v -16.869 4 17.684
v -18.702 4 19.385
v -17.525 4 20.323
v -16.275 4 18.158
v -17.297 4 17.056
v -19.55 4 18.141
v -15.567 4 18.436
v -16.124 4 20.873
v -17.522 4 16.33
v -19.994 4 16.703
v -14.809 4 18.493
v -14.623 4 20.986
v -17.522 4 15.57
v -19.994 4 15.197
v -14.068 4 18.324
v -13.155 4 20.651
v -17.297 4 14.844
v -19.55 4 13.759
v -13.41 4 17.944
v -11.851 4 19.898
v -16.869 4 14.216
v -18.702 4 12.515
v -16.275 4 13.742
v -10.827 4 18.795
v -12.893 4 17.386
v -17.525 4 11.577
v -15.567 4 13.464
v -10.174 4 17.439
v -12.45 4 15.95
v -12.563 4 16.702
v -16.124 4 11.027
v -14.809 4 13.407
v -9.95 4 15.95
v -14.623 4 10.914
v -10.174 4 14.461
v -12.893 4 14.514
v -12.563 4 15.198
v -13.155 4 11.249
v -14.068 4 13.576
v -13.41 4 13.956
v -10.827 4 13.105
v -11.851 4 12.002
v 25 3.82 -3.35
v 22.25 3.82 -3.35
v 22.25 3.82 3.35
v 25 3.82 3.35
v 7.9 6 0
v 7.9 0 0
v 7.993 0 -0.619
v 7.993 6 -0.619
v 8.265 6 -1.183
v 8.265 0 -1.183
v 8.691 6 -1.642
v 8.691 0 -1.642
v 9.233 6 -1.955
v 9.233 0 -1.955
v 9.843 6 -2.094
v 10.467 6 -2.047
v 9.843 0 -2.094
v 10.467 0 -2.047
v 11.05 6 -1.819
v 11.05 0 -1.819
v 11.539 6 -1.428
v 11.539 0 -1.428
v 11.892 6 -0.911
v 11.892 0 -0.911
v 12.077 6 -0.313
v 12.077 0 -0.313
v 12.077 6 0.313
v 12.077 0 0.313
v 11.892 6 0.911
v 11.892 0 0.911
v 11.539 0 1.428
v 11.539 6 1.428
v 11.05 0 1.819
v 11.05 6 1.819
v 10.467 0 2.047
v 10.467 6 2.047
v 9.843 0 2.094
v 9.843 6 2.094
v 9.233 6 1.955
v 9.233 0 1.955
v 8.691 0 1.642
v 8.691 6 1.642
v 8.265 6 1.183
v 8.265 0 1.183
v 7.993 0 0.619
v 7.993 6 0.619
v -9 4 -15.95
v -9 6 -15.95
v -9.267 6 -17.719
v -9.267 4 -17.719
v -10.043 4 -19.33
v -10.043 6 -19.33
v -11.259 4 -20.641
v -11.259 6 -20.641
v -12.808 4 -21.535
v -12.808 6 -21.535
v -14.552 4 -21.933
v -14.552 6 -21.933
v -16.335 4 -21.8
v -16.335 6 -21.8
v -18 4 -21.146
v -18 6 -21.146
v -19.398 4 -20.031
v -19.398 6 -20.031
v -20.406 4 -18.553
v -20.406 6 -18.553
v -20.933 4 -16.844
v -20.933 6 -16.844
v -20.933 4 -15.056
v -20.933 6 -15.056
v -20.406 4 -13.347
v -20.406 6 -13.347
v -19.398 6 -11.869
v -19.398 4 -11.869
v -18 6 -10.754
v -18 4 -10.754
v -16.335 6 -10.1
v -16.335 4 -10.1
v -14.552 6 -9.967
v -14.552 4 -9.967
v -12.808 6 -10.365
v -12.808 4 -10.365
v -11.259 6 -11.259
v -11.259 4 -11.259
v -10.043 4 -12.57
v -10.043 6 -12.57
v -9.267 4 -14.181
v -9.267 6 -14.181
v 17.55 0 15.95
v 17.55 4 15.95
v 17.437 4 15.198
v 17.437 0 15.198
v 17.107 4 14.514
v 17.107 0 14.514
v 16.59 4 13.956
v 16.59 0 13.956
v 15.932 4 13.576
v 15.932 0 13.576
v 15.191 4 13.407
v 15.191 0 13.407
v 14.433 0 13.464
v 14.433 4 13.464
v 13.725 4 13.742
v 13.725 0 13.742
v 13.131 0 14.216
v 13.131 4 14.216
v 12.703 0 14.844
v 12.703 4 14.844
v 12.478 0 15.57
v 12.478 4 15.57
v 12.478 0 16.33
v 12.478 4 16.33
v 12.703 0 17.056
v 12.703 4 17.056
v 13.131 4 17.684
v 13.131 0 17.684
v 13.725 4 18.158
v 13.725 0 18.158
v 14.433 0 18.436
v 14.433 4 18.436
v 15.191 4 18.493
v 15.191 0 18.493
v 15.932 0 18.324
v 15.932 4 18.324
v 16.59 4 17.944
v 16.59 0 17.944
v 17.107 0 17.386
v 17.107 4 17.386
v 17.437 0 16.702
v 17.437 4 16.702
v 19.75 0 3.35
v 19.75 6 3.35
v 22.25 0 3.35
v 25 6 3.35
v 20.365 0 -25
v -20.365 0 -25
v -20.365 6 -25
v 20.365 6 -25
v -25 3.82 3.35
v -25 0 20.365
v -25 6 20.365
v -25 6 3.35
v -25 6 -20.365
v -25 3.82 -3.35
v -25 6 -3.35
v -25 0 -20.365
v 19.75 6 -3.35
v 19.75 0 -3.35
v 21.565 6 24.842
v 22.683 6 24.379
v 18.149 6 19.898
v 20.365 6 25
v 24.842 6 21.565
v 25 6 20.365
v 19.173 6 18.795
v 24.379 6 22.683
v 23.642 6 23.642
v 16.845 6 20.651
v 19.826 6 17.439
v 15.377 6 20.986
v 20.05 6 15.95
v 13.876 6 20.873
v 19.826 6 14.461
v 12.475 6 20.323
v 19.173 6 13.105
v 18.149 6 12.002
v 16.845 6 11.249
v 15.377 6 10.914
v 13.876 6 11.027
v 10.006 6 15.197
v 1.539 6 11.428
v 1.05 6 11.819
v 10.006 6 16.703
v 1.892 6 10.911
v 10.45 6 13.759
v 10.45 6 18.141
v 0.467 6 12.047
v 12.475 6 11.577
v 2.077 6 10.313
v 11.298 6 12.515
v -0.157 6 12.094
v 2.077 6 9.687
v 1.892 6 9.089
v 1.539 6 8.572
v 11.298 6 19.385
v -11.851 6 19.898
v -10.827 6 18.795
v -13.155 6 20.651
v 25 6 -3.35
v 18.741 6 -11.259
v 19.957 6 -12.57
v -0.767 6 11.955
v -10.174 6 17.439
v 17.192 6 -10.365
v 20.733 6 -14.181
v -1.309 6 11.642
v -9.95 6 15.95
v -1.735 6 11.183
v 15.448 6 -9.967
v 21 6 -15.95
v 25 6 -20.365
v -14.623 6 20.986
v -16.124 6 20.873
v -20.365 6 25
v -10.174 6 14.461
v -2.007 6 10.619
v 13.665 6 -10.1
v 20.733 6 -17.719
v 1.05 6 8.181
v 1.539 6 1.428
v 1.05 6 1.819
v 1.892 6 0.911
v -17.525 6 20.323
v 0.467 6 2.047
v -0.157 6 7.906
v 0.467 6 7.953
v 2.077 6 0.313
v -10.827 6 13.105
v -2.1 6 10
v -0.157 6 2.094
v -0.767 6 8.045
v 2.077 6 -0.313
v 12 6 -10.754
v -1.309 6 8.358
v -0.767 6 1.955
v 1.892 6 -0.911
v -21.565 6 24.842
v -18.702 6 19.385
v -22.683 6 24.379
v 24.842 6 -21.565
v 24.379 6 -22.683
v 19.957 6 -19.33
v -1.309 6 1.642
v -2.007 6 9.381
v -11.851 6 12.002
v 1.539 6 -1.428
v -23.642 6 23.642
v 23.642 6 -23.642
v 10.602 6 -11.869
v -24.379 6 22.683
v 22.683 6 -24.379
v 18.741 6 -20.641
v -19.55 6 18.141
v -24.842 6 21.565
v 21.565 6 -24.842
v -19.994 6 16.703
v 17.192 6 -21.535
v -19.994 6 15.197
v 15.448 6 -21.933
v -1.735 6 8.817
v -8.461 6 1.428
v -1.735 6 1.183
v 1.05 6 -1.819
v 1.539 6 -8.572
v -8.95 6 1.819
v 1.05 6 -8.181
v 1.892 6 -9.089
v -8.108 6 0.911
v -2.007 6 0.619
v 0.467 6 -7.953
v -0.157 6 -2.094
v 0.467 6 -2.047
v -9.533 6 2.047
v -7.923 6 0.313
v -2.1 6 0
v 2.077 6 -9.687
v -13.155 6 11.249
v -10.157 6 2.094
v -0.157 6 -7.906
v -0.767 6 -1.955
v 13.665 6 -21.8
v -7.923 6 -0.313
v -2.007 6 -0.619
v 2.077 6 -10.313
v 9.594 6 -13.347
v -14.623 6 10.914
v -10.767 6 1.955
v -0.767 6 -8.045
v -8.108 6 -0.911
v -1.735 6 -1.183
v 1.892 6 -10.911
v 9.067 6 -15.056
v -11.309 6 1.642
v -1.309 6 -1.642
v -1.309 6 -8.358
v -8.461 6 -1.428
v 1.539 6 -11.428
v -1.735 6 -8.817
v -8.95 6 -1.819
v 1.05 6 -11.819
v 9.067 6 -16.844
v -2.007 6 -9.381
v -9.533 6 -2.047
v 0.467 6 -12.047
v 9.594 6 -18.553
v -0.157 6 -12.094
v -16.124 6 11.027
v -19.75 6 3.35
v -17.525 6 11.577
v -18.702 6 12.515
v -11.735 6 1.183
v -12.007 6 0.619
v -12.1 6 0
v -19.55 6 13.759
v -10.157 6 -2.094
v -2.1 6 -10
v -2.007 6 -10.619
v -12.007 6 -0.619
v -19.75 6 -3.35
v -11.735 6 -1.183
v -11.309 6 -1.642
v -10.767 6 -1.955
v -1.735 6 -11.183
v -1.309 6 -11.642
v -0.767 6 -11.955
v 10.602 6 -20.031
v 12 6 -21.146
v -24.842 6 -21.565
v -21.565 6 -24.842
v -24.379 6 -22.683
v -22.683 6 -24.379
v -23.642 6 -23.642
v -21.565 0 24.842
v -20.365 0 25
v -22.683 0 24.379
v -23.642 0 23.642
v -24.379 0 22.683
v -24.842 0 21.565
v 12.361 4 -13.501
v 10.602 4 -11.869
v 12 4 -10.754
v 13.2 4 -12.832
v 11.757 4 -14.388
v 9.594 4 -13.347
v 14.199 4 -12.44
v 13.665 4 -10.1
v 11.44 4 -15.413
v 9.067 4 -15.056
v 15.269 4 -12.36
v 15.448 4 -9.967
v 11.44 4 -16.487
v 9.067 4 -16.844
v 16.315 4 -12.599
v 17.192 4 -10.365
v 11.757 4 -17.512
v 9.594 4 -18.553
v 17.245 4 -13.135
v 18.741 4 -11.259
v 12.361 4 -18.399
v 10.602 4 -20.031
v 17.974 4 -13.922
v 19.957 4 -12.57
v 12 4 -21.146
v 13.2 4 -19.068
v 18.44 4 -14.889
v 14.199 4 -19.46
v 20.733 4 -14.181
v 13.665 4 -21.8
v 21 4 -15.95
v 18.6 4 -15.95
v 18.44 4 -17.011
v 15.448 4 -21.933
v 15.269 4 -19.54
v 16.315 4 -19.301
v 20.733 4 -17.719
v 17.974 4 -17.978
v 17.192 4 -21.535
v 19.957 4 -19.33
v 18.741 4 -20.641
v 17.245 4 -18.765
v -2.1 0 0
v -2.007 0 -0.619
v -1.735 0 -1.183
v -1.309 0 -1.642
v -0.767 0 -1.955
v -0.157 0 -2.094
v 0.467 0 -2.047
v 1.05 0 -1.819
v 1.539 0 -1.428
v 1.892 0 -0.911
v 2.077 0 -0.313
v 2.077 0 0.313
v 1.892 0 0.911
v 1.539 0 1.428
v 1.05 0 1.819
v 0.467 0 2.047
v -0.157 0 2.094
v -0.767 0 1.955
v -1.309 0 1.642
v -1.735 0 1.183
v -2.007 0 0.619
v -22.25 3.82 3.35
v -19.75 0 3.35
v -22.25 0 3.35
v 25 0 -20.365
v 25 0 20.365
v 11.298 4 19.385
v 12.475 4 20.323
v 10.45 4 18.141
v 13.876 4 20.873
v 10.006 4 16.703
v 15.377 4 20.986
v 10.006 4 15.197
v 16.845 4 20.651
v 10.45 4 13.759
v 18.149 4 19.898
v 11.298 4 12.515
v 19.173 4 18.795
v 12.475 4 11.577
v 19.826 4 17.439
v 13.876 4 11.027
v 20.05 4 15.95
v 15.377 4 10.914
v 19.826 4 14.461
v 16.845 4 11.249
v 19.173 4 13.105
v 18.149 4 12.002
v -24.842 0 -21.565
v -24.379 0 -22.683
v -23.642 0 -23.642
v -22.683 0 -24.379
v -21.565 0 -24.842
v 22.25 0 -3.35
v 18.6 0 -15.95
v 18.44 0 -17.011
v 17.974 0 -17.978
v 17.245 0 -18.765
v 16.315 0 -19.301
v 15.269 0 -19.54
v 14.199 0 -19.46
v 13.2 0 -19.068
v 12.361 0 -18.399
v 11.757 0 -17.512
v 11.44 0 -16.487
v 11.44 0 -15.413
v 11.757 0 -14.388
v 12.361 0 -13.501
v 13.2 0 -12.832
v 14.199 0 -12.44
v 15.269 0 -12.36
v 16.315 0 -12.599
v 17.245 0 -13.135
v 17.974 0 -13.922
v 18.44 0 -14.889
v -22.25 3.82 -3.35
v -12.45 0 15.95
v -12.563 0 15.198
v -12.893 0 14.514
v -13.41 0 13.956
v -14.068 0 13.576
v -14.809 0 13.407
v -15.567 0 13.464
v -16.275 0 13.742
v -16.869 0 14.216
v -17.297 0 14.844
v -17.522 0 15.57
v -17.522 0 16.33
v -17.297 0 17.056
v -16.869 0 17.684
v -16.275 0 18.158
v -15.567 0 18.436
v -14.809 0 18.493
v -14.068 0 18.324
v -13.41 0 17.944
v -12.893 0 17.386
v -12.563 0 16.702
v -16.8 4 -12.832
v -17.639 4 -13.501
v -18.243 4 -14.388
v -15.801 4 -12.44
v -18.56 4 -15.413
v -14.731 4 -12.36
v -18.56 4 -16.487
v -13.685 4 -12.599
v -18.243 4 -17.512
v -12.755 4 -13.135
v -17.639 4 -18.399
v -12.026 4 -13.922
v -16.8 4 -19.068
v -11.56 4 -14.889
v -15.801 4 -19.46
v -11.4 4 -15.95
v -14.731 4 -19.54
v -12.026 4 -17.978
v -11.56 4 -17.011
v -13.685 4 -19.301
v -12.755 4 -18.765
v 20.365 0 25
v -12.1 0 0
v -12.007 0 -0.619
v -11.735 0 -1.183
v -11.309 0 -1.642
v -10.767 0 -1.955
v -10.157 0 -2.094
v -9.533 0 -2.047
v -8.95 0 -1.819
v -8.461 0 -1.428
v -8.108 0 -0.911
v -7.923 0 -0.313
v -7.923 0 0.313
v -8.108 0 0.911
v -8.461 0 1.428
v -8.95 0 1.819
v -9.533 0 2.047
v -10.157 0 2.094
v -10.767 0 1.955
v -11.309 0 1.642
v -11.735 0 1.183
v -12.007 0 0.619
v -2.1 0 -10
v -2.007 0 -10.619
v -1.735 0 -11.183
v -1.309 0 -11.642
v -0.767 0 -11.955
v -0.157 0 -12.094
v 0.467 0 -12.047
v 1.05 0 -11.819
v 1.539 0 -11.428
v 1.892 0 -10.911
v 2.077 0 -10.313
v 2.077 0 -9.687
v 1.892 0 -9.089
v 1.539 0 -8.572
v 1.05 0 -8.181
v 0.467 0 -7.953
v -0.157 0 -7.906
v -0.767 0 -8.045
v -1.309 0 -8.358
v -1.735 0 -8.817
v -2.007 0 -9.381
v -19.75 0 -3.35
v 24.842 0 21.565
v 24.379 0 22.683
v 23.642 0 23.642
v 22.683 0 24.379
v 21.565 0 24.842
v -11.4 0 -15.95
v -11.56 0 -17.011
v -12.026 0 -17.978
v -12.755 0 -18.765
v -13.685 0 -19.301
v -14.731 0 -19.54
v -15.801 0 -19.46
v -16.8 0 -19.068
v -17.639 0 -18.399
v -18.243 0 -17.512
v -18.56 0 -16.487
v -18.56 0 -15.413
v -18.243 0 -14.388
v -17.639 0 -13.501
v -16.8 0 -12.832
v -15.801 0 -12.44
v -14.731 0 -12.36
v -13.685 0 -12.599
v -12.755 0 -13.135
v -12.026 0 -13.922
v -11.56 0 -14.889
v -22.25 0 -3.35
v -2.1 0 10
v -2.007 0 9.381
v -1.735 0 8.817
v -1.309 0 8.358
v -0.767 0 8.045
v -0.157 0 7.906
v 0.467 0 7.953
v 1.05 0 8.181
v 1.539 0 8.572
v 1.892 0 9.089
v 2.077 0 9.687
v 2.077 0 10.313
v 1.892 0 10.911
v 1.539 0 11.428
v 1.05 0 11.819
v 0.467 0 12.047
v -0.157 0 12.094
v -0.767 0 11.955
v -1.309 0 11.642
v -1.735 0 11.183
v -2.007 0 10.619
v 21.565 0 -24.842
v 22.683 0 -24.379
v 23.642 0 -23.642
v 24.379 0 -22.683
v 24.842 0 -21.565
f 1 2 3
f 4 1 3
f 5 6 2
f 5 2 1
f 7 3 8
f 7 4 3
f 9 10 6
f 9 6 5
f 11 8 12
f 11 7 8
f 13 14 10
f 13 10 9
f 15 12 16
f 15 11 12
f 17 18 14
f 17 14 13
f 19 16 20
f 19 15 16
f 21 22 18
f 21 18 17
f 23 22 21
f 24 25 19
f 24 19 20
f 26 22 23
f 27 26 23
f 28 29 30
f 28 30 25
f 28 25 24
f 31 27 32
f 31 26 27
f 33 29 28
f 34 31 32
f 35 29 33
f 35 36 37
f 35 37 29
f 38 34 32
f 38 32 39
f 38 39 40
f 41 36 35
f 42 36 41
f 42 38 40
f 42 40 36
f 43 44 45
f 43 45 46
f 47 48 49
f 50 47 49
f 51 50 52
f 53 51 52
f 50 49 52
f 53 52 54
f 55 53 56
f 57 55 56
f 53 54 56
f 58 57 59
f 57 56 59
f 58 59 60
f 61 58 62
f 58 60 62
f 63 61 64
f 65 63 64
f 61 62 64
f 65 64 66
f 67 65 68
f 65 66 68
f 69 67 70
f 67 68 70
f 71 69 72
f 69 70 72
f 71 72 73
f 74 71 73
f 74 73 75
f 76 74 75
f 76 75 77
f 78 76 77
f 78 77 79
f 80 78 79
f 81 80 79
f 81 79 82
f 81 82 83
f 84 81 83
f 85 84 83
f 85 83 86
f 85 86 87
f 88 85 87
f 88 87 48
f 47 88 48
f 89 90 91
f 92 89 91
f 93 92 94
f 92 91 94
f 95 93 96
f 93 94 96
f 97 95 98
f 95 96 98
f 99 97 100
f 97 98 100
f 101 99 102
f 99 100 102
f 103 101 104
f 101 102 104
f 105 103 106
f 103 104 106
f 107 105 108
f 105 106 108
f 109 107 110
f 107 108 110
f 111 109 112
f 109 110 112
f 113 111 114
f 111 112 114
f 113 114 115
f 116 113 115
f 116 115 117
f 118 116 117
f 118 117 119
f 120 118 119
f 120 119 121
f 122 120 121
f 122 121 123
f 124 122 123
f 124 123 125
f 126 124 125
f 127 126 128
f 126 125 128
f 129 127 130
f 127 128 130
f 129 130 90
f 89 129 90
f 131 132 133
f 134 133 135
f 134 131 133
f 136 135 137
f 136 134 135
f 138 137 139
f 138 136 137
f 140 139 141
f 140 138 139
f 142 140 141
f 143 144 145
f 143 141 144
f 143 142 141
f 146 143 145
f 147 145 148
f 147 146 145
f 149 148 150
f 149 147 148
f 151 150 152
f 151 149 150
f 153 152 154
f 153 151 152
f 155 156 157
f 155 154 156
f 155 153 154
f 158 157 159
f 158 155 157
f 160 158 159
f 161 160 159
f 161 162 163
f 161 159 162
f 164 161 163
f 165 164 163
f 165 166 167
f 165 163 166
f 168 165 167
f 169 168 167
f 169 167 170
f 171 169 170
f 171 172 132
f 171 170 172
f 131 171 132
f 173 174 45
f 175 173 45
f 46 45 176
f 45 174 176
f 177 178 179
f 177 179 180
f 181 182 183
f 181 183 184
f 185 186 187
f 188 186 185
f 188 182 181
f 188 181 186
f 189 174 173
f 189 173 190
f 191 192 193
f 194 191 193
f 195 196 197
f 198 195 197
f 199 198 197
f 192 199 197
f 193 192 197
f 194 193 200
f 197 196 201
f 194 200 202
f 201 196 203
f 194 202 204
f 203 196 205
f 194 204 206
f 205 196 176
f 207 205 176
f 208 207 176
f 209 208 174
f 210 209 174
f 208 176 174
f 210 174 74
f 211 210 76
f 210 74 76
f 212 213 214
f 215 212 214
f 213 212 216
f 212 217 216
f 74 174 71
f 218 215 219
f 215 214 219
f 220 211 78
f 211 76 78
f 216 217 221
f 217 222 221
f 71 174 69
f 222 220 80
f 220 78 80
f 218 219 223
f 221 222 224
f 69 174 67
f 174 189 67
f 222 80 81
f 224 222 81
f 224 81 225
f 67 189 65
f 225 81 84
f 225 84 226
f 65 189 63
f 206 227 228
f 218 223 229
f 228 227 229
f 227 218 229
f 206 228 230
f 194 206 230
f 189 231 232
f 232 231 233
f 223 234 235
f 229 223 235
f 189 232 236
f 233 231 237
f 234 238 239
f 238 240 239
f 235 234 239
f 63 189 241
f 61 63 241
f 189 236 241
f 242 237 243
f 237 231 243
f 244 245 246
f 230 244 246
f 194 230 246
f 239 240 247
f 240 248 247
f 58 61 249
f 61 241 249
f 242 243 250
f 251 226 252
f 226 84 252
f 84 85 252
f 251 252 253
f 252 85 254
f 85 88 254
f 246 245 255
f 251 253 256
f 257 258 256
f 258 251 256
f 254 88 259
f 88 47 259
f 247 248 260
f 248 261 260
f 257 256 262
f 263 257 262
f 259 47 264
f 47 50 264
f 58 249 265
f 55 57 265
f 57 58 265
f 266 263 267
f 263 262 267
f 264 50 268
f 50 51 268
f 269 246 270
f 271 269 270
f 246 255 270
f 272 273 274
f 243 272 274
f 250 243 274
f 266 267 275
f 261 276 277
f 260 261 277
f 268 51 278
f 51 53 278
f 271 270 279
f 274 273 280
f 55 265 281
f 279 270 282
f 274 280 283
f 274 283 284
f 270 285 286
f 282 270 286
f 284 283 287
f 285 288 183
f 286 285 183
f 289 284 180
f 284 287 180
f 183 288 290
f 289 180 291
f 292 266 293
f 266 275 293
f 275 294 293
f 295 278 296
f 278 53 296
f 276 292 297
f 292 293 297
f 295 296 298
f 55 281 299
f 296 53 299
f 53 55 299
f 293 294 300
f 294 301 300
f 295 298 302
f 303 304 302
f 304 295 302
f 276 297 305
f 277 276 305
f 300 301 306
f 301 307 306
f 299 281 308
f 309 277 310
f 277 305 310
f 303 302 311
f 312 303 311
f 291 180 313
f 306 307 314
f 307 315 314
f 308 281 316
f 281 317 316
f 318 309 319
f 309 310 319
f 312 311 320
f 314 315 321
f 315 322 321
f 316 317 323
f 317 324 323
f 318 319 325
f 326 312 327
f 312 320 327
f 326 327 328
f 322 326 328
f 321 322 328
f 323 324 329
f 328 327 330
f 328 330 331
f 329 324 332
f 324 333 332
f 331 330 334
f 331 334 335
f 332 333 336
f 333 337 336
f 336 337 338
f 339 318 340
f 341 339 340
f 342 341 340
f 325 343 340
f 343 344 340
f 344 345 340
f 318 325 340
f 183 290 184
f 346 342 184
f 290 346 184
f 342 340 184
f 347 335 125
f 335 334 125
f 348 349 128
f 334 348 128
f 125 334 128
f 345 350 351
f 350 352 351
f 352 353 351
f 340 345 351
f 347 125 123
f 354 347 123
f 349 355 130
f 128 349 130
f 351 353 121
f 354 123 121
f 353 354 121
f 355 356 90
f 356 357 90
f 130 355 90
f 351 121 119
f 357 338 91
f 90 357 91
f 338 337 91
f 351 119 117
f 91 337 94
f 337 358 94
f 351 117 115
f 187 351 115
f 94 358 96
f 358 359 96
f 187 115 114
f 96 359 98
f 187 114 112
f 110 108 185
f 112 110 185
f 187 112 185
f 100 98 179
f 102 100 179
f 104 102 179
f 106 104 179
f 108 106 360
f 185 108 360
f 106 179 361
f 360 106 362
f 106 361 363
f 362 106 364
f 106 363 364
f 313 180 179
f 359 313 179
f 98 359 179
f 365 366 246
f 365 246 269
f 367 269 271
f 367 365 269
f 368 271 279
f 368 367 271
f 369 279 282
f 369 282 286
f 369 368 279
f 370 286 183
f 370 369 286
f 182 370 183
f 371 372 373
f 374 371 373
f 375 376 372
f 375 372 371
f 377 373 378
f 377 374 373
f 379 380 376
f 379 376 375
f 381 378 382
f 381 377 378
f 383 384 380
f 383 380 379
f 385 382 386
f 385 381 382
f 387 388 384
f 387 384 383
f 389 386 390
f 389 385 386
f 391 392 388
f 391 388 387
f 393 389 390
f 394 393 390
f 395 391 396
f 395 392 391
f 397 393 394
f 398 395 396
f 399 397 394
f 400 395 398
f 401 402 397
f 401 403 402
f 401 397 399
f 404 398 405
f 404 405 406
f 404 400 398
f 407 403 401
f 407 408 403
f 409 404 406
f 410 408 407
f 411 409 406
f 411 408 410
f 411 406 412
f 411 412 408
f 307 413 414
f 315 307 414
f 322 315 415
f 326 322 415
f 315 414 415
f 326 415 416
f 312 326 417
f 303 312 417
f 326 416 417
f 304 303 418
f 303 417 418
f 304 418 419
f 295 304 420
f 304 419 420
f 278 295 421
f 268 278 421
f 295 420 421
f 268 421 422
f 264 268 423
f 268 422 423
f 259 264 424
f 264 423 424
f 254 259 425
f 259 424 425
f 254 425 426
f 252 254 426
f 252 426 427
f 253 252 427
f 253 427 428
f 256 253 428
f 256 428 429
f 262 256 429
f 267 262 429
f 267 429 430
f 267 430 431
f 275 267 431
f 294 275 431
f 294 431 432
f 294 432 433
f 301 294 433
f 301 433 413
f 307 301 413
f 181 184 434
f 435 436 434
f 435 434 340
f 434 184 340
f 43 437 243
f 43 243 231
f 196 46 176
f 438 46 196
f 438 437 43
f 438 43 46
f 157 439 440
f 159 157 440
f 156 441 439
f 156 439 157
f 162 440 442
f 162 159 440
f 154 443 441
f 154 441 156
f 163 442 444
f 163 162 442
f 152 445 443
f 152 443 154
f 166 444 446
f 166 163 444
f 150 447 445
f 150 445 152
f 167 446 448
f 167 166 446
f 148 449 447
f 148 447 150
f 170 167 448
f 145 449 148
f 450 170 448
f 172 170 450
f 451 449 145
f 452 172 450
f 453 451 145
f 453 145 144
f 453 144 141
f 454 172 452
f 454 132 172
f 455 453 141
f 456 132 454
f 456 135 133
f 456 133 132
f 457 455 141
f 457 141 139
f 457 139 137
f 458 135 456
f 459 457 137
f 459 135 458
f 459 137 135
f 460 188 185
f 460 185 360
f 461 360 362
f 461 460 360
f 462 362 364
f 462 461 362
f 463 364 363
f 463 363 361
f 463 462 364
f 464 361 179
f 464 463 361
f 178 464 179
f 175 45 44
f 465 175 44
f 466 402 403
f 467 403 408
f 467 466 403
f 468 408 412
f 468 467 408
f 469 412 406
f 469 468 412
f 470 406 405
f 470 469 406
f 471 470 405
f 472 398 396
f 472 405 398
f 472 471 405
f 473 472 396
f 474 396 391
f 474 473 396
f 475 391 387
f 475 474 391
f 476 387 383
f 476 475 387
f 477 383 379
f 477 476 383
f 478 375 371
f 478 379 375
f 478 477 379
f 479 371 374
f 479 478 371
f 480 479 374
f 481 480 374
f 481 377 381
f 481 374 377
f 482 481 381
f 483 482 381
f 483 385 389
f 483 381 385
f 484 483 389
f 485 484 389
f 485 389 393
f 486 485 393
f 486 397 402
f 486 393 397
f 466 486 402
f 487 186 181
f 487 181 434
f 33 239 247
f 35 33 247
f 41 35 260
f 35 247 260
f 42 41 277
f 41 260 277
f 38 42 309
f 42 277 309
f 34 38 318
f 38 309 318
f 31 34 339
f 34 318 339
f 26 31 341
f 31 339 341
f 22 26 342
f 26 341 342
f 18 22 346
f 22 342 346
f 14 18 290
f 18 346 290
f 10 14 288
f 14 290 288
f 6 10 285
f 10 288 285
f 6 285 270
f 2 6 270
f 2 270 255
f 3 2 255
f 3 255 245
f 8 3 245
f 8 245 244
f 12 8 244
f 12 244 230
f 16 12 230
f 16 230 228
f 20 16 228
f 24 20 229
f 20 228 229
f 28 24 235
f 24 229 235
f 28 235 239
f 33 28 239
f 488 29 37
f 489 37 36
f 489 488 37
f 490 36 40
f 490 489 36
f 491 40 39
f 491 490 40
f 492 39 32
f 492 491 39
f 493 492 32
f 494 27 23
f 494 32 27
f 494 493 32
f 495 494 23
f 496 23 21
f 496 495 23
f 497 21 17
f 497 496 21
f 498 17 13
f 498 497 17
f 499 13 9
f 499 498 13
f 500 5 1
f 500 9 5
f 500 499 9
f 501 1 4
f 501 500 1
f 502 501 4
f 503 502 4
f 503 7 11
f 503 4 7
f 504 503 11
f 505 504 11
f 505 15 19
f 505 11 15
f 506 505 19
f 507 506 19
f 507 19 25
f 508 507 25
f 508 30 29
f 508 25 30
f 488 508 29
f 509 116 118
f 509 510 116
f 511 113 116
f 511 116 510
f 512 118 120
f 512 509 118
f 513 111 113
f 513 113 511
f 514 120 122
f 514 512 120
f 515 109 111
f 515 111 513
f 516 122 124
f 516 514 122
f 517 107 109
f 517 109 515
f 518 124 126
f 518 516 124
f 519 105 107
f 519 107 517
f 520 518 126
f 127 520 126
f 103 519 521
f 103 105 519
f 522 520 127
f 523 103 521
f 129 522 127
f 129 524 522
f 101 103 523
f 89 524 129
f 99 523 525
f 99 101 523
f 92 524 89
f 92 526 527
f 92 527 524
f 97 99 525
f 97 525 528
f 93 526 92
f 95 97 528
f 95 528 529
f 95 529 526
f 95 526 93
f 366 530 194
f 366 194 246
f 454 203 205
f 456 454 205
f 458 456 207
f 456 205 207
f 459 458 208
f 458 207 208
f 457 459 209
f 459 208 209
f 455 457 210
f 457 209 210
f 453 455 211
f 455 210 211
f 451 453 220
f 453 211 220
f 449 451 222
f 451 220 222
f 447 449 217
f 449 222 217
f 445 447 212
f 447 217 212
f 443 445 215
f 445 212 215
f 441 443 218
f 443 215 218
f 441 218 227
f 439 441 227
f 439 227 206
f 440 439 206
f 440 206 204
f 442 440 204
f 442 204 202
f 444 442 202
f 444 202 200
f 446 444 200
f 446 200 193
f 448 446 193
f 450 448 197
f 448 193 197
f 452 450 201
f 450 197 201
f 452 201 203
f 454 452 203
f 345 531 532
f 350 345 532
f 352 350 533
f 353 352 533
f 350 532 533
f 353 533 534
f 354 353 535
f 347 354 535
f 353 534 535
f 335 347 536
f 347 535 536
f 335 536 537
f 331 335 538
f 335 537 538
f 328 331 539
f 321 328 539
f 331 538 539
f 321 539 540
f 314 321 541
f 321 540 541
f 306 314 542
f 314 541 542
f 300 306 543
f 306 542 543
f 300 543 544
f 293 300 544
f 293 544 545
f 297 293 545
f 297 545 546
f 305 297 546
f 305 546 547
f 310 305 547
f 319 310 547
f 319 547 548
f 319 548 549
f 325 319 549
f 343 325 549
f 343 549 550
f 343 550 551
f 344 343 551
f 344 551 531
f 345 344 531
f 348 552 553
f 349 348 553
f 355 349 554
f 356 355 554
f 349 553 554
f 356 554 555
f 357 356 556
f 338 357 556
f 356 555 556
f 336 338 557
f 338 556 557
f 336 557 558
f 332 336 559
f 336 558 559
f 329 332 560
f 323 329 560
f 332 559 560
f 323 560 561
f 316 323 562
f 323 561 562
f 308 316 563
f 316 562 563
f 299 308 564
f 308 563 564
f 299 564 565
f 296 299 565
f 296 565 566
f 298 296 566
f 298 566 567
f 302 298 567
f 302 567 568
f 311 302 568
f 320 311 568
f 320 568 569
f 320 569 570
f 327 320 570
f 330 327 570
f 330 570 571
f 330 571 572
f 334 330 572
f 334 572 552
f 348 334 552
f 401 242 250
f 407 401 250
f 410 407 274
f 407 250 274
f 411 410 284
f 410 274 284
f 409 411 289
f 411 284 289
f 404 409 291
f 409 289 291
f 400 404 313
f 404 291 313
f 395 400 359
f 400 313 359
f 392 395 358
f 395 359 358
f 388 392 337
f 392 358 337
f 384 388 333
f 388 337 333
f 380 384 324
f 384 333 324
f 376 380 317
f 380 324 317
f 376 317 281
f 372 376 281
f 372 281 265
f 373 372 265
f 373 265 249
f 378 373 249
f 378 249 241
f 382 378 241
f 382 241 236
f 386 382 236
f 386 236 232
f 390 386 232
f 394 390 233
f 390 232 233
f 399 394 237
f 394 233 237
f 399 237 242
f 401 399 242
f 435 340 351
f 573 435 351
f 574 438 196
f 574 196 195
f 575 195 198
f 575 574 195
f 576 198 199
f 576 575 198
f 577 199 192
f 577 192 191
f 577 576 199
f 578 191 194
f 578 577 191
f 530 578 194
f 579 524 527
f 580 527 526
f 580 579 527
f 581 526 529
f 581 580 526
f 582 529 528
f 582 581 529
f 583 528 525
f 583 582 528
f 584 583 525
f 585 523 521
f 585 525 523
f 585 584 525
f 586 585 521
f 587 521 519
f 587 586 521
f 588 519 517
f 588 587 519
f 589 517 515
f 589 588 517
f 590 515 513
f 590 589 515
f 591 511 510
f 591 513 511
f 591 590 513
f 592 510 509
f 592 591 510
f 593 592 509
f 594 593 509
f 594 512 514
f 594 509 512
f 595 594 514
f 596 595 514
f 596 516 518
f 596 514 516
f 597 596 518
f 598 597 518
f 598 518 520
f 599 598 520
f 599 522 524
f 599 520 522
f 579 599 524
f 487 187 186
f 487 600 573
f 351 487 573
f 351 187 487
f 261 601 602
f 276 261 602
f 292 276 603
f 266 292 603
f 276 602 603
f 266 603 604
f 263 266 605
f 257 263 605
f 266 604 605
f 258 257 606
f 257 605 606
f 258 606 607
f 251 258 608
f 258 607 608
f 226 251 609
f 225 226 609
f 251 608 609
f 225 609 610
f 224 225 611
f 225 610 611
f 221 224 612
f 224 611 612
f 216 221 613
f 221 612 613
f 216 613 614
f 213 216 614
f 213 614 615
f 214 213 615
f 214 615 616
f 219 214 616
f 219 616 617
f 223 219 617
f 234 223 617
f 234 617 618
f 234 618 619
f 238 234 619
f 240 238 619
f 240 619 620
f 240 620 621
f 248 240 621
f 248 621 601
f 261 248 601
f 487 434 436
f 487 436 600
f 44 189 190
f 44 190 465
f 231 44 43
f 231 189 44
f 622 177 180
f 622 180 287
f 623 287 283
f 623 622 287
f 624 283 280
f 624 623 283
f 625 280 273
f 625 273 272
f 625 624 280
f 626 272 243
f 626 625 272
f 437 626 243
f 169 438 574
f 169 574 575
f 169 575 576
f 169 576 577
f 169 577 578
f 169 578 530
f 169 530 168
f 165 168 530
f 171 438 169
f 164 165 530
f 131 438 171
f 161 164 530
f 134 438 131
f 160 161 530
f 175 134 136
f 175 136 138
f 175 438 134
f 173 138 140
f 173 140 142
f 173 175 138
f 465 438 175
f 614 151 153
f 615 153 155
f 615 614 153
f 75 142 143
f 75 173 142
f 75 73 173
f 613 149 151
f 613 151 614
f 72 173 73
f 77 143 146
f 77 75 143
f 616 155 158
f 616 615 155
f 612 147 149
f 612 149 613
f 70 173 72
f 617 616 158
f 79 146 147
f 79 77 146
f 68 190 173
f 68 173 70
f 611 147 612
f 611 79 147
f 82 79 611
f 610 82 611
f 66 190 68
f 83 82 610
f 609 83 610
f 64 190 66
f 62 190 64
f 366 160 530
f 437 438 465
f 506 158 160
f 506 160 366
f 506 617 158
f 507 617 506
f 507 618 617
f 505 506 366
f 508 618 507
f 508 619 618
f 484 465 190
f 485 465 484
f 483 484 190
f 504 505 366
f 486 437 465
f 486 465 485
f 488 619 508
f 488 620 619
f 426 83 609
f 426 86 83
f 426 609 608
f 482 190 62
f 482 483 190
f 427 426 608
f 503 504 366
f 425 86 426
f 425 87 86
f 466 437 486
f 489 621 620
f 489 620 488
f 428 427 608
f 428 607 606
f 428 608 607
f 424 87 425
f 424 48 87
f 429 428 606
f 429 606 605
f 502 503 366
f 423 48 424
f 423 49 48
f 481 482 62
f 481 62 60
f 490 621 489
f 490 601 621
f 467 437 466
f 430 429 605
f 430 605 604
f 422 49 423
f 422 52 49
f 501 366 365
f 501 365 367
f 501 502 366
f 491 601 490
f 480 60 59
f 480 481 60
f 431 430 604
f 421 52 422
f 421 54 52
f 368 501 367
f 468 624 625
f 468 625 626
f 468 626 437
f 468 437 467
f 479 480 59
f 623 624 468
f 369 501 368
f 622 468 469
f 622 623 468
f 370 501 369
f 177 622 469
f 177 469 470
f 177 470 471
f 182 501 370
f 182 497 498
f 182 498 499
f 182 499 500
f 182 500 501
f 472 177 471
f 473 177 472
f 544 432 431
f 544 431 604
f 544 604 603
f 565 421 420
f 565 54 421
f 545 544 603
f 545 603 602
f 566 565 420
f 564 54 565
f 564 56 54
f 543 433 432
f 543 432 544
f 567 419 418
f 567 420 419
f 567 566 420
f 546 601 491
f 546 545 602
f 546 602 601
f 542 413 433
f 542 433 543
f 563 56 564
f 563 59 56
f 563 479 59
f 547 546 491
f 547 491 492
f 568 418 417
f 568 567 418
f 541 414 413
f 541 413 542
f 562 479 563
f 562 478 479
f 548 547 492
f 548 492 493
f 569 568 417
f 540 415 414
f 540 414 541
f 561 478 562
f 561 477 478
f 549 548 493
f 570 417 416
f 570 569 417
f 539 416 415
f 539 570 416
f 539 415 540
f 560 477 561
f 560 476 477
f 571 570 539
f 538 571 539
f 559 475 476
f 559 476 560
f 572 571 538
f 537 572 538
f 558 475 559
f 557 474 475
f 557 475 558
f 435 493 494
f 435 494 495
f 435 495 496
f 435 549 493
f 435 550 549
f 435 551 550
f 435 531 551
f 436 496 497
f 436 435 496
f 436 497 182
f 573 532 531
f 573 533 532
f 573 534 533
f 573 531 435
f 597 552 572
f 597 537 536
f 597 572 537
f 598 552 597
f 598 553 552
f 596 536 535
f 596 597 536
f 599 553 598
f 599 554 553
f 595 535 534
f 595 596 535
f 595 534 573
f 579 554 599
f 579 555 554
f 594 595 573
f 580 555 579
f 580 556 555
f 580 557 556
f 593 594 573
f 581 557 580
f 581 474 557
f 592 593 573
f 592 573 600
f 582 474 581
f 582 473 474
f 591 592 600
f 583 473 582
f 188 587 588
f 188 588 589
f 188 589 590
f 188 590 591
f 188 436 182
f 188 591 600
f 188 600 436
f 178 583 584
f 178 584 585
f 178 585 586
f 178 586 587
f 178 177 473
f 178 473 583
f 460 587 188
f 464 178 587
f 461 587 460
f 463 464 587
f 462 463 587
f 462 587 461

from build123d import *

# Parameters (mm, degrees)
SKETCH1_R             = 3.6
SKETCH1_R_2           = 2.55
BOSS_EXTRUDE1_DEPTH   = 6
M5X0_8_TAPPED_HOLE1_D = 4.2
SKETCH2_R             = 6
SKETCH2_R_2           = 5.05
CUT_EXTRUDE1_DEPTH    = 2
SKETCH5_W             = 5.25
SKETCH5_H             = 6.7
CUT_EXTRUDE2_DEPTH    = 2.18
SKETCH6_W             = 2.5
SKETCH6_H             = 6.7
CUT_EXTRUDE3_DEPTH    = 4.82


with BuildPart() as part:
    # Sketch1 → Boss-Extrude1 (new body)
    with BuildSketch(Plane(origin=(0, 0, 0), x_dir=(1, 0, 0), z_dir=(0, 1, 0))):
        with BuildLine():
            Line((20.365, -25), (-20.365, -25))
            ThreePointArc((-20.365, -25), (-23.642439931, -23.642439931), (-25, -20.365))
            Line((-25, -20.365), (-25, 20.365))
            ThreePointArc((-25, 20.365), (-23.642439931, 23.642439931), (-20.365, 25))
            Line((-20.365, 25), (20.365, 25))
            ThreePointArc((20.365, 25), (23.642439931, 23.642439931), (25, 20.365))
            Line((25, 20.365), (25, -20.365))
            ThreePointArc((25, -20.365), (23.642439931, -23.642439931), (20.365, -25))
        make_face()
        with Locations((-15, 15.95)):
            Circle(SKETCH1_R, mode=Mode.SUBTRACT)
        with Locations((15, 15.95)):
            Circle(SKETCH1_R, mode=Mode.SUBTRACT)
        with Locations((15, -15.95)):
            Circle(SKETCH1_R_2, mode=Mode.SUBTRACT)
        with Locations((-15, -15.95)):
            Circle(SKETCH1_R_2, mode=Mode.SUBTRACT)
    extrude(amount=BOSS_EXTRUDE1_DEPTH)

    # M5x0.8 Tapped Hole1 (through all)
    with Locations(Plane(origin=(0, 6, 0), x_dir=(1, 0, 0), z_dir=(0, 1, 0))):
        with Locations((0, 10), (-10, 0), (0, 0), (0, -10), (10, 0)):
            Hole(M5X0_8_TAPPED_HOLE1_D / 2)

    # Sketch2 → Cut-Extrude1 (cut)
    with BuildSketch(Plane(origin=(0, 6, 0), x_dir=(1, 0, 0), z_dir=(0, 1, 0))):
        with Locations((-15, 15.95)):
            Circle(SKETCH2_R)
        with Locations((15, 15.95)):
            Circle(SKETCH2_R)
        with Locations((15, -15.95)):
            Circle(SKETCH2_R_2)
        with Locations((-15, -15.95)):
            Circle(SKETCH2_R_2)
    extrude(amount=-CUT_EXTRUDE1_DEPTH, mode=Mode.SUBTRACT)

    # Sketch5 → Cut-Extrude2 (cut)
    with BuildSketch(Plane(origin=(0, 6, 0), x_dir=(1, 0, 0), z_dir=(0, 1, 0))):
        with Locations((-22.375, 0)):
            Rectangle(SKETCH5_W, SKETCH5_H)
        with Locations((22.375, 0)):
            Rectangle(SKETCH5_W, SKETCH5_H)
    extrude(amount=-CUT_EXTRUDE2_DEPTH, mode=Mode.SUBTRACT)

    # Sketch6 → Cut-Extrude3 (cut, through all)
    with BuildSketch(Plane(origin=(0, 3.82, 0), x_dir=(1, 0, 0), z_dir=(0, 1, 0))):
        with Locations((-21, 0)):
            Rectangle(SKETCH6_W, SKETCH6_H)
        with Locations((21, 0)):
            Rectangle(SKETCH6_W, SKETCH6_H)
    extrude(amount=-CUT_EXTRUDE3_DEPTH, mode=Mode.SUBTRACT)


solid = part.part
